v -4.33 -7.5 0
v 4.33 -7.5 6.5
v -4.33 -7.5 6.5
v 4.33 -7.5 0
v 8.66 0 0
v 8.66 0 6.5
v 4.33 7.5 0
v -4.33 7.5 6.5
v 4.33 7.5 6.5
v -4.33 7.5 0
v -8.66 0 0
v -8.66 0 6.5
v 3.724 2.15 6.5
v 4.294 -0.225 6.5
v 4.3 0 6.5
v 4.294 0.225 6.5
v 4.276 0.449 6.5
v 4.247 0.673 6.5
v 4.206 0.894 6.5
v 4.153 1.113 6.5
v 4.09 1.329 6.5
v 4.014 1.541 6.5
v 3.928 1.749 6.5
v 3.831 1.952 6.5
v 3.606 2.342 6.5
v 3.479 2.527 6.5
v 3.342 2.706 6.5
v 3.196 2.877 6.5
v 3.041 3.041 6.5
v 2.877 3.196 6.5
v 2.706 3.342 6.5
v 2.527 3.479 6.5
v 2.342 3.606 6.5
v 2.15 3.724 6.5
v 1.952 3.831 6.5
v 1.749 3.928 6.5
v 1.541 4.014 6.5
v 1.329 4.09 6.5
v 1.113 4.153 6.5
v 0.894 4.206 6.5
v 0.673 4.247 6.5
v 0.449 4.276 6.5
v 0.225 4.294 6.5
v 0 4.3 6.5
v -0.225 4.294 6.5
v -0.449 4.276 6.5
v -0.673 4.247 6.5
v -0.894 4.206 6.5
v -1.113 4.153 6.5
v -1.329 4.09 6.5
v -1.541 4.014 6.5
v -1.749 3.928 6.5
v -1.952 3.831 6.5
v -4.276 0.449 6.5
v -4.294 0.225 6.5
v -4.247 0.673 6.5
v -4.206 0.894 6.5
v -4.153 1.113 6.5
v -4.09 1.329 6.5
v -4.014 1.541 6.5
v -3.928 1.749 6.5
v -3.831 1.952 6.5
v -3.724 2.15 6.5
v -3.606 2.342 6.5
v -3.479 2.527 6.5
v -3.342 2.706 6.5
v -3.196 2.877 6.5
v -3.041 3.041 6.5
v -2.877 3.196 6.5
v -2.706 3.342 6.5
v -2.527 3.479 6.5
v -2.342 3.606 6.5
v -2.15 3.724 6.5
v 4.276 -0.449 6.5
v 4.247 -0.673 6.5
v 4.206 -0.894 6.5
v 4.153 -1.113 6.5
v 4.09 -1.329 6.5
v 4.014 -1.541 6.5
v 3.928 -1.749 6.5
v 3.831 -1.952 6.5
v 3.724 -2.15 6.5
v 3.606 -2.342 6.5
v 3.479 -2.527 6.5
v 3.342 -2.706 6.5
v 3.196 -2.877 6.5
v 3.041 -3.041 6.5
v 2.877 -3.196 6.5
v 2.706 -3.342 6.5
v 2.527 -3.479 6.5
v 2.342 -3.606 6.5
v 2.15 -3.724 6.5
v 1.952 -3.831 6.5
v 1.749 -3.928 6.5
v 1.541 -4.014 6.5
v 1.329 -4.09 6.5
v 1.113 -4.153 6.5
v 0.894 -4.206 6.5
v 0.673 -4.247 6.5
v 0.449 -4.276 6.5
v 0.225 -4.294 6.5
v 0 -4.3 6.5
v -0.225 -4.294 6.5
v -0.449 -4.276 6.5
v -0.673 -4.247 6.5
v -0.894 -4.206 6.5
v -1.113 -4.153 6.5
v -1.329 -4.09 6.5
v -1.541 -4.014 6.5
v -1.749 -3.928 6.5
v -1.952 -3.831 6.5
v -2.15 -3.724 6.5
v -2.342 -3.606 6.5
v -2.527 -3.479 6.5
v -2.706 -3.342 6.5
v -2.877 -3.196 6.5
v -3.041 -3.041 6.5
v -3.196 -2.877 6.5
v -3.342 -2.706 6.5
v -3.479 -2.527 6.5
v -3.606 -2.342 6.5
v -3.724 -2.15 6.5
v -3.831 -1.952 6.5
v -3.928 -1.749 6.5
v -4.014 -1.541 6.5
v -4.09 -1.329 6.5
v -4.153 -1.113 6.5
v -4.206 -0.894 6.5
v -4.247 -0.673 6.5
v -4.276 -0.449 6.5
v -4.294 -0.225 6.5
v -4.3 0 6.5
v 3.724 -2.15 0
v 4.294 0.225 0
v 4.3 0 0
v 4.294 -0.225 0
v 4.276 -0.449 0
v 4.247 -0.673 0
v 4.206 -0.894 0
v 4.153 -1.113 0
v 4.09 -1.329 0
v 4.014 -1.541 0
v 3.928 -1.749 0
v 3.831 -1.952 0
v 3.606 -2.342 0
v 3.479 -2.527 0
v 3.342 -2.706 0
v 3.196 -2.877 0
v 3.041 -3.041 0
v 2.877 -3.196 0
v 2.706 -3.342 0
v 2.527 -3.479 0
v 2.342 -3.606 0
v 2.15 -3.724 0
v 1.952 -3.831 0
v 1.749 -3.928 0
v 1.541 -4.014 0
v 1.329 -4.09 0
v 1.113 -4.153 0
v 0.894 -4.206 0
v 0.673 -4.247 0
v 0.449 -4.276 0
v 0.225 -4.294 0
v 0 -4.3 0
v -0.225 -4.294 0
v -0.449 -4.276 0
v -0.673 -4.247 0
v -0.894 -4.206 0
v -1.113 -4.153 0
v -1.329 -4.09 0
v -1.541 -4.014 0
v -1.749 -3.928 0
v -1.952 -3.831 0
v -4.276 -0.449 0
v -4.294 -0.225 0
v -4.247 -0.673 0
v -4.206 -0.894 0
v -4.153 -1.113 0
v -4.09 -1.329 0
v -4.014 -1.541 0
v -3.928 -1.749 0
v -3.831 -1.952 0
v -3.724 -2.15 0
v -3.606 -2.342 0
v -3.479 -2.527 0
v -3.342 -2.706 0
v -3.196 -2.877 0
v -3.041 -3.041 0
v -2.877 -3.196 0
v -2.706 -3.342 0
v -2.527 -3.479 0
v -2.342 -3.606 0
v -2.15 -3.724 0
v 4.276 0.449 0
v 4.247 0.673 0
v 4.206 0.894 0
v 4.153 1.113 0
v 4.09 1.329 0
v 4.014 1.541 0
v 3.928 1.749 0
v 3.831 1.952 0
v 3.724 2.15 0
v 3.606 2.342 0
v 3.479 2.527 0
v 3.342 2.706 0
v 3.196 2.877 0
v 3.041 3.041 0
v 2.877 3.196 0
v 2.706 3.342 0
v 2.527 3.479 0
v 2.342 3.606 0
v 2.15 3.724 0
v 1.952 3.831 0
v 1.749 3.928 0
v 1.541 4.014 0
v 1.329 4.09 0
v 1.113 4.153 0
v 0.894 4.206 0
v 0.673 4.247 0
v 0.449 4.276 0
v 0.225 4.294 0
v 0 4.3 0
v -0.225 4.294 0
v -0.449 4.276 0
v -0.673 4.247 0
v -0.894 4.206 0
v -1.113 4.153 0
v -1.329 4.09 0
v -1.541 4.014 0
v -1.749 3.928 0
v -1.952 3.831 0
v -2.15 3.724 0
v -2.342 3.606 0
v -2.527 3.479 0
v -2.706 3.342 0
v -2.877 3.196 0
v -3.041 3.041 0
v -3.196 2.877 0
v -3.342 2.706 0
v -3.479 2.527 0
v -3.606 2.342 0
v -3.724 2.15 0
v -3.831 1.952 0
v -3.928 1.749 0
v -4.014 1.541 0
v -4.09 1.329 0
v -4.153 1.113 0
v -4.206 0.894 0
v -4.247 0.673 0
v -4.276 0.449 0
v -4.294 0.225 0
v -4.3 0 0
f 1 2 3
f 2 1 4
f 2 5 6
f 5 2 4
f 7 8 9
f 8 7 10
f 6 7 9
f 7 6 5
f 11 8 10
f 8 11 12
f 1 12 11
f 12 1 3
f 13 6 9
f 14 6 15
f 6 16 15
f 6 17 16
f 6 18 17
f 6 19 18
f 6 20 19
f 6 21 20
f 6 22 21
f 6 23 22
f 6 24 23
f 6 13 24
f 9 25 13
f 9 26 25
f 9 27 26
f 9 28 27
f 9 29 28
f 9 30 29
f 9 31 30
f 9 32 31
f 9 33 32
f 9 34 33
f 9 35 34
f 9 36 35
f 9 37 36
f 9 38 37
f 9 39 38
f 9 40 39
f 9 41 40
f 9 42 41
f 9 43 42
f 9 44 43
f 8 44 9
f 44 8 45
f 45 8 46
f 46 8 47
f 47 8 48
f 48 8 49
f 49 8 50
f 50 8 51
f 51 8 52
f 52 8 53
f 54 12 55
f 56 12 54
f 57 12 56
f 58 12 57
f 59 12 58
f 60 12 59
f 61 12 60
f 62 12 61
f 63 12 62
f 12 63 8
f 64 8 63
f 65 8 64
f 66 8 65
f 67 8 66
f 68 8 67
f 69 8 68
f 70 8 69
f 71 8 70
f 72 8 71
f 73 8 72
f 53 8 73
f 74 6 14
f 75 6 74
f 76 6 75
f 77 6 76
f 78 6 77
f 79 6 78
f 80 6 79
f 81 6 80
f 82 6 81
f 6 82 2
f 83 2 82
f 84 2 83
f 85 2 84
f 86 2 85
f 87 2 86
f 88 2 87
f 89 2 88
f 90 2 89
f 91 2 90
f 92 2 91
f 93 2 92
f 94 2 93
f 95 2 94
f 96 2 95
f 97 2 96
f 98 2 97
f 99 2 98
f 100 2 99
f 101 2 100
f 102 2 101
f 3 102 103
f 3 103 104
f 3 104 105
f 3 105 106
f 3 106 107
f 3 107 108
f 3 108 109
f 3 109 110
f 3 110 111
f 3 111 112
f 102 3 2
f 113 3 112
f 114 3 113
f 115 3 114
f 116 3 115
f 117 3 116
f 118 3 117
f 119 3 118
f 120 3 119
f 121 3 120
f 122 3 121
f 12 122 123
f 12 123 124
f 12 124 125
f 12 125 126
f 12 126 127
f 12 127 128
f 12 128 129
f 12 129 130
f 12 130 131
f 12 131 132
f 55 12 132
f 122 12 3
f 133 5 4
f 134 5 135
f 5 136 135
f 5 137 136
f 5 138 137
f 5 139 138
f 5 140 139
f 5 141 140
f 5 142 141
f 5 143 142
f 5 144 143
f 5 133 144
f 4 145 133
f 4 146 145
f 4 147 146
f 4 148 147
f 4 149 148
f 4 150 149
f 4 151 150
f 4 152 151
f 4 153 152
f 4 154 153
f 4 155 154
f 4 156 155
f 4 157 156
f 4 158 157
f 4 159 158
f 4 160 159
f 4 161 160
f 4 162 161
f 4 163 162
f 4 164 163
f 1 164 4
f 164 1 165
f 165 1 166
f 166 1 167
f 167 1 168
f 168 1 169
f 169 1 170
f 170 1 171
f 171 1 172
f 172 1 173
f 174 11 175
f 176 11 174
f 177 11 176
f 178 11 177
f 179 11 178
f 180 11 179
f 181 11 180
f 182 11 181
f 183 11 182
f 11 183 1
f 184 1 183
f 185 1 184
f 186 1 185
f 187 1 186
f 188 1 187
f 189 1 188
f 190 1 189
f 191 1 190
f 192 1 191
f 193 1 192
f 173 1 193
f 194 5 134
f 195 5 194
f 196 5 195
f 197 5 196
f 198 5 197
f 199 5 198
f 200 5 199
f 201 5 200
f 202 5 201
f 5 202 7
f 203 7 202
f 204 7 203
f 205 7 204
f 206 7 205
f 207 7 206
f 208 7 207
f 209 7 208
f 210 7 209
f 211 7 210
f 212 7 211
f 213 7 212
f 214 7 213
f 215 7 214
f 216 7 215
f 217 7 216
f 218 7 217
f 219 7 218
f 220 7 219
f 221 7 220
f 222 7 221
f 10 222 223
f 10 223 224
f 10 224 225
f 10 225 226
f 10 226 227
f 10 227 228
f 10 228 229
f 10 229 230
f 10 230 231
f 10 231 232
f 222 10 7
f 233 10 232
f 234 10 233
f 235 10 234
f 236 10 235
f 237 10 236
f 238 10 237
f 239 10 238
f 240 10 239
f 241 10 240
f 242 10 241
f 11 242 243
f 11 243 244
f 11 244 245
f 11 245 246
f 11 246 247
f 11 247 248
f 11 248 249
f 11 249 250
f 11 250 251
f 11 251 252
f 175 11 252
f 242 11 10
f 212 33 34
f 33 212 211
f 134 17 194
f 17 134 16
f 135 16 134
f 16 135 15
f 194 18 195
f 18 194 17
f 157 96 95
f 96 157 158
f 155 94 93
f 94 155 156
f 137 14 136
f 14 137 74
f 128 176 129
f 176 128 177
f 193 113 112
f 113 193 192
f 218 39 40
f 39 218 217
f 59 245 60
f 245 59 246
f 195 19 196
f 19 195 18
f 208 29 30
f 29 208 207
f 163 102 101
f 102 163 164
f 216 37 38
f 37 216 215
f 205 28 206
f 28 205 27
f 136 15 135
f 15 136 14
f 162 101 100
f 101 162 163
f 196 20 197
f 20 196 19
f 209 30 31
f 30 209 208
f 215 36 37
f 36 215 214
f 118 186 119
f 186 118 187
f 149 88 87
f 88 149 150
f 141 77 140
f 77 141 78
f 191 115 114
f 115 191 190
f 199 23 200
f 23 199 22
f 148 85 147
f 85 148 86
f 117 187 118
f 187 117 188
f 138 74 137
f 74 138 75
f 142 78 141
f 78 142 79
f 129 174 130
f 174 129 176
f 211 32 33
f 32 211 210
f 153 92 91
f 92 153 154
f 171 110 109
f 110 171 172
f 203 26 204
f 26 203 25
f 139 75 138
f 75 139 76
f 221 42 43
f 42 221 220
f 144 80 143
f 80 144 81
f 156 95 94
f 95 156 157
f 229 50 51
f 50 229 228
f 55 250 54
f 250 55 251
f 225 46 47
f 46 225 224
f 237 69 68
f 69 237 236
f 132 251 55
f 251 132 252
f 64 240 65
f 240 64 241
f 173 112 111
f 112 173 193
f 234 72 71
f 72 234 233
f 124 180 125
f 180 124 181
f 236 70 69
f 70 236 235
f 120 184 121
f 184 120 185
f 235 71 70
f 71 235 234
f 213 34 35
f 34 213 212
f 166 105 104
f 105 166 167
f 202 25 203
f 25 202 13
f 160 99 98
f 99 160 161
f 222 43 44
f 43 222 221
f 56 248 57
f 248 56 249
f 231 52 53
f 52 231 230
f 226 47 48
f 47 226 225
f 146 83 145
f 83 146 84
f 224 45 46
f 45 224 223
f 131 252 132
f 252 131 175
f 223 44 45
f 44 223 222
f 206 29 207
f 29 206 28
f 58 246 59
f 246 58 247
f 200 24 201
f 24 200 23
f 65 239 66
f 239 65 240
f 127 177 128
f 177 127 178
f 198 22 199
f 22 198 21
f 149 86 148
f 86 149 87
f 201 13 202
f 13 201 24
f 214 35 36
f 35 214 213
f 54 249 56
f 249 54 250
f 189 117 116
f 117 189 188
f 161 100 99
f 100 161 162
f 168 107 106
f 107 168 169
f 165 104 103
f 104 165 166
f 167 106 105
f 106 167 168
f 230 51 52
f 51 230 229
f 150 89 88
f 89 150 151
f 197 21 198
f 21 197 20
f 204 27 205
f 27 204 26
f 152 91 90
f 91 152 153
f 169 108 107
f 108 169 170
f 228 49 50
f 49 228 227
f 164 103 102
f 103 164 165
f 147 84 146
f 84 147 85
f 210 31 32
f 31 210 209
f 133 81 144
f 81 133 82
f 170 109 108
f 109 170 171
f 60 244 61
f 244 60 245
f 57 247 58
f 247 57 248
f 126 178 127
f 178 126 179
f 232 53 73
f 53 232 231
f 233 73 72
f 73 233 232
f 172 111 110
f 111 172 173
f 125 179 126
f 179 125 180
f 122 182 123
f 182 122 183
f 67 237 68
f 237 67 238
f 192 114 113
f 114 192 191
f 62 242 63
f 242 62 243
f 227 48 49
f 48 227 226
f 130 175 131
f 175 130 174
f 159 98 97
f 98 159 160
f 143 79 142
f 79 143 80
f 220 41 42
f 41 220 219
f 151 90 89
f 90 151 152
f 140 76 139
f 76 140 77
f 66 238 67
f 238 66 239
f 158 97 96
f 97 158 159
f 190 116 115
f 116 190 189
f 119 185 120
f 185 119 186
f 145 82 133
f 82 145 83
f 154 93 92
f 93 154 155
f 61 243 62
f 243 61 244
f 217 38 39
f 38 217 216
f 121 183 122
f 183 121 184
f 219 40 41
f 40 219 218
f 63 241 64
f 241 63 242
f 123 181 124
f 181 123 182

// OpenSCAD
$fn = 120;

screw_d = 8.0;          // nominal screw diameter (mm)
clearance = 0.6;        // typical clearance for M8 (mm)
hole_d = screw_d + clearance;

across_flats = 15.0;    // mm
thickness = 6.5;        // mm

// For a regular hexagon: across_flats = sqrt(3) * circumradius
hex_R = across_flats / sqrt(3);

difference() {
    cylinder(h = thickness, r = hex_R, $fn = 6);
    translate([0,0,-0.2])
        cylinder(h = thickness + 0.4, d = hole_d, $fn = 120);
}
